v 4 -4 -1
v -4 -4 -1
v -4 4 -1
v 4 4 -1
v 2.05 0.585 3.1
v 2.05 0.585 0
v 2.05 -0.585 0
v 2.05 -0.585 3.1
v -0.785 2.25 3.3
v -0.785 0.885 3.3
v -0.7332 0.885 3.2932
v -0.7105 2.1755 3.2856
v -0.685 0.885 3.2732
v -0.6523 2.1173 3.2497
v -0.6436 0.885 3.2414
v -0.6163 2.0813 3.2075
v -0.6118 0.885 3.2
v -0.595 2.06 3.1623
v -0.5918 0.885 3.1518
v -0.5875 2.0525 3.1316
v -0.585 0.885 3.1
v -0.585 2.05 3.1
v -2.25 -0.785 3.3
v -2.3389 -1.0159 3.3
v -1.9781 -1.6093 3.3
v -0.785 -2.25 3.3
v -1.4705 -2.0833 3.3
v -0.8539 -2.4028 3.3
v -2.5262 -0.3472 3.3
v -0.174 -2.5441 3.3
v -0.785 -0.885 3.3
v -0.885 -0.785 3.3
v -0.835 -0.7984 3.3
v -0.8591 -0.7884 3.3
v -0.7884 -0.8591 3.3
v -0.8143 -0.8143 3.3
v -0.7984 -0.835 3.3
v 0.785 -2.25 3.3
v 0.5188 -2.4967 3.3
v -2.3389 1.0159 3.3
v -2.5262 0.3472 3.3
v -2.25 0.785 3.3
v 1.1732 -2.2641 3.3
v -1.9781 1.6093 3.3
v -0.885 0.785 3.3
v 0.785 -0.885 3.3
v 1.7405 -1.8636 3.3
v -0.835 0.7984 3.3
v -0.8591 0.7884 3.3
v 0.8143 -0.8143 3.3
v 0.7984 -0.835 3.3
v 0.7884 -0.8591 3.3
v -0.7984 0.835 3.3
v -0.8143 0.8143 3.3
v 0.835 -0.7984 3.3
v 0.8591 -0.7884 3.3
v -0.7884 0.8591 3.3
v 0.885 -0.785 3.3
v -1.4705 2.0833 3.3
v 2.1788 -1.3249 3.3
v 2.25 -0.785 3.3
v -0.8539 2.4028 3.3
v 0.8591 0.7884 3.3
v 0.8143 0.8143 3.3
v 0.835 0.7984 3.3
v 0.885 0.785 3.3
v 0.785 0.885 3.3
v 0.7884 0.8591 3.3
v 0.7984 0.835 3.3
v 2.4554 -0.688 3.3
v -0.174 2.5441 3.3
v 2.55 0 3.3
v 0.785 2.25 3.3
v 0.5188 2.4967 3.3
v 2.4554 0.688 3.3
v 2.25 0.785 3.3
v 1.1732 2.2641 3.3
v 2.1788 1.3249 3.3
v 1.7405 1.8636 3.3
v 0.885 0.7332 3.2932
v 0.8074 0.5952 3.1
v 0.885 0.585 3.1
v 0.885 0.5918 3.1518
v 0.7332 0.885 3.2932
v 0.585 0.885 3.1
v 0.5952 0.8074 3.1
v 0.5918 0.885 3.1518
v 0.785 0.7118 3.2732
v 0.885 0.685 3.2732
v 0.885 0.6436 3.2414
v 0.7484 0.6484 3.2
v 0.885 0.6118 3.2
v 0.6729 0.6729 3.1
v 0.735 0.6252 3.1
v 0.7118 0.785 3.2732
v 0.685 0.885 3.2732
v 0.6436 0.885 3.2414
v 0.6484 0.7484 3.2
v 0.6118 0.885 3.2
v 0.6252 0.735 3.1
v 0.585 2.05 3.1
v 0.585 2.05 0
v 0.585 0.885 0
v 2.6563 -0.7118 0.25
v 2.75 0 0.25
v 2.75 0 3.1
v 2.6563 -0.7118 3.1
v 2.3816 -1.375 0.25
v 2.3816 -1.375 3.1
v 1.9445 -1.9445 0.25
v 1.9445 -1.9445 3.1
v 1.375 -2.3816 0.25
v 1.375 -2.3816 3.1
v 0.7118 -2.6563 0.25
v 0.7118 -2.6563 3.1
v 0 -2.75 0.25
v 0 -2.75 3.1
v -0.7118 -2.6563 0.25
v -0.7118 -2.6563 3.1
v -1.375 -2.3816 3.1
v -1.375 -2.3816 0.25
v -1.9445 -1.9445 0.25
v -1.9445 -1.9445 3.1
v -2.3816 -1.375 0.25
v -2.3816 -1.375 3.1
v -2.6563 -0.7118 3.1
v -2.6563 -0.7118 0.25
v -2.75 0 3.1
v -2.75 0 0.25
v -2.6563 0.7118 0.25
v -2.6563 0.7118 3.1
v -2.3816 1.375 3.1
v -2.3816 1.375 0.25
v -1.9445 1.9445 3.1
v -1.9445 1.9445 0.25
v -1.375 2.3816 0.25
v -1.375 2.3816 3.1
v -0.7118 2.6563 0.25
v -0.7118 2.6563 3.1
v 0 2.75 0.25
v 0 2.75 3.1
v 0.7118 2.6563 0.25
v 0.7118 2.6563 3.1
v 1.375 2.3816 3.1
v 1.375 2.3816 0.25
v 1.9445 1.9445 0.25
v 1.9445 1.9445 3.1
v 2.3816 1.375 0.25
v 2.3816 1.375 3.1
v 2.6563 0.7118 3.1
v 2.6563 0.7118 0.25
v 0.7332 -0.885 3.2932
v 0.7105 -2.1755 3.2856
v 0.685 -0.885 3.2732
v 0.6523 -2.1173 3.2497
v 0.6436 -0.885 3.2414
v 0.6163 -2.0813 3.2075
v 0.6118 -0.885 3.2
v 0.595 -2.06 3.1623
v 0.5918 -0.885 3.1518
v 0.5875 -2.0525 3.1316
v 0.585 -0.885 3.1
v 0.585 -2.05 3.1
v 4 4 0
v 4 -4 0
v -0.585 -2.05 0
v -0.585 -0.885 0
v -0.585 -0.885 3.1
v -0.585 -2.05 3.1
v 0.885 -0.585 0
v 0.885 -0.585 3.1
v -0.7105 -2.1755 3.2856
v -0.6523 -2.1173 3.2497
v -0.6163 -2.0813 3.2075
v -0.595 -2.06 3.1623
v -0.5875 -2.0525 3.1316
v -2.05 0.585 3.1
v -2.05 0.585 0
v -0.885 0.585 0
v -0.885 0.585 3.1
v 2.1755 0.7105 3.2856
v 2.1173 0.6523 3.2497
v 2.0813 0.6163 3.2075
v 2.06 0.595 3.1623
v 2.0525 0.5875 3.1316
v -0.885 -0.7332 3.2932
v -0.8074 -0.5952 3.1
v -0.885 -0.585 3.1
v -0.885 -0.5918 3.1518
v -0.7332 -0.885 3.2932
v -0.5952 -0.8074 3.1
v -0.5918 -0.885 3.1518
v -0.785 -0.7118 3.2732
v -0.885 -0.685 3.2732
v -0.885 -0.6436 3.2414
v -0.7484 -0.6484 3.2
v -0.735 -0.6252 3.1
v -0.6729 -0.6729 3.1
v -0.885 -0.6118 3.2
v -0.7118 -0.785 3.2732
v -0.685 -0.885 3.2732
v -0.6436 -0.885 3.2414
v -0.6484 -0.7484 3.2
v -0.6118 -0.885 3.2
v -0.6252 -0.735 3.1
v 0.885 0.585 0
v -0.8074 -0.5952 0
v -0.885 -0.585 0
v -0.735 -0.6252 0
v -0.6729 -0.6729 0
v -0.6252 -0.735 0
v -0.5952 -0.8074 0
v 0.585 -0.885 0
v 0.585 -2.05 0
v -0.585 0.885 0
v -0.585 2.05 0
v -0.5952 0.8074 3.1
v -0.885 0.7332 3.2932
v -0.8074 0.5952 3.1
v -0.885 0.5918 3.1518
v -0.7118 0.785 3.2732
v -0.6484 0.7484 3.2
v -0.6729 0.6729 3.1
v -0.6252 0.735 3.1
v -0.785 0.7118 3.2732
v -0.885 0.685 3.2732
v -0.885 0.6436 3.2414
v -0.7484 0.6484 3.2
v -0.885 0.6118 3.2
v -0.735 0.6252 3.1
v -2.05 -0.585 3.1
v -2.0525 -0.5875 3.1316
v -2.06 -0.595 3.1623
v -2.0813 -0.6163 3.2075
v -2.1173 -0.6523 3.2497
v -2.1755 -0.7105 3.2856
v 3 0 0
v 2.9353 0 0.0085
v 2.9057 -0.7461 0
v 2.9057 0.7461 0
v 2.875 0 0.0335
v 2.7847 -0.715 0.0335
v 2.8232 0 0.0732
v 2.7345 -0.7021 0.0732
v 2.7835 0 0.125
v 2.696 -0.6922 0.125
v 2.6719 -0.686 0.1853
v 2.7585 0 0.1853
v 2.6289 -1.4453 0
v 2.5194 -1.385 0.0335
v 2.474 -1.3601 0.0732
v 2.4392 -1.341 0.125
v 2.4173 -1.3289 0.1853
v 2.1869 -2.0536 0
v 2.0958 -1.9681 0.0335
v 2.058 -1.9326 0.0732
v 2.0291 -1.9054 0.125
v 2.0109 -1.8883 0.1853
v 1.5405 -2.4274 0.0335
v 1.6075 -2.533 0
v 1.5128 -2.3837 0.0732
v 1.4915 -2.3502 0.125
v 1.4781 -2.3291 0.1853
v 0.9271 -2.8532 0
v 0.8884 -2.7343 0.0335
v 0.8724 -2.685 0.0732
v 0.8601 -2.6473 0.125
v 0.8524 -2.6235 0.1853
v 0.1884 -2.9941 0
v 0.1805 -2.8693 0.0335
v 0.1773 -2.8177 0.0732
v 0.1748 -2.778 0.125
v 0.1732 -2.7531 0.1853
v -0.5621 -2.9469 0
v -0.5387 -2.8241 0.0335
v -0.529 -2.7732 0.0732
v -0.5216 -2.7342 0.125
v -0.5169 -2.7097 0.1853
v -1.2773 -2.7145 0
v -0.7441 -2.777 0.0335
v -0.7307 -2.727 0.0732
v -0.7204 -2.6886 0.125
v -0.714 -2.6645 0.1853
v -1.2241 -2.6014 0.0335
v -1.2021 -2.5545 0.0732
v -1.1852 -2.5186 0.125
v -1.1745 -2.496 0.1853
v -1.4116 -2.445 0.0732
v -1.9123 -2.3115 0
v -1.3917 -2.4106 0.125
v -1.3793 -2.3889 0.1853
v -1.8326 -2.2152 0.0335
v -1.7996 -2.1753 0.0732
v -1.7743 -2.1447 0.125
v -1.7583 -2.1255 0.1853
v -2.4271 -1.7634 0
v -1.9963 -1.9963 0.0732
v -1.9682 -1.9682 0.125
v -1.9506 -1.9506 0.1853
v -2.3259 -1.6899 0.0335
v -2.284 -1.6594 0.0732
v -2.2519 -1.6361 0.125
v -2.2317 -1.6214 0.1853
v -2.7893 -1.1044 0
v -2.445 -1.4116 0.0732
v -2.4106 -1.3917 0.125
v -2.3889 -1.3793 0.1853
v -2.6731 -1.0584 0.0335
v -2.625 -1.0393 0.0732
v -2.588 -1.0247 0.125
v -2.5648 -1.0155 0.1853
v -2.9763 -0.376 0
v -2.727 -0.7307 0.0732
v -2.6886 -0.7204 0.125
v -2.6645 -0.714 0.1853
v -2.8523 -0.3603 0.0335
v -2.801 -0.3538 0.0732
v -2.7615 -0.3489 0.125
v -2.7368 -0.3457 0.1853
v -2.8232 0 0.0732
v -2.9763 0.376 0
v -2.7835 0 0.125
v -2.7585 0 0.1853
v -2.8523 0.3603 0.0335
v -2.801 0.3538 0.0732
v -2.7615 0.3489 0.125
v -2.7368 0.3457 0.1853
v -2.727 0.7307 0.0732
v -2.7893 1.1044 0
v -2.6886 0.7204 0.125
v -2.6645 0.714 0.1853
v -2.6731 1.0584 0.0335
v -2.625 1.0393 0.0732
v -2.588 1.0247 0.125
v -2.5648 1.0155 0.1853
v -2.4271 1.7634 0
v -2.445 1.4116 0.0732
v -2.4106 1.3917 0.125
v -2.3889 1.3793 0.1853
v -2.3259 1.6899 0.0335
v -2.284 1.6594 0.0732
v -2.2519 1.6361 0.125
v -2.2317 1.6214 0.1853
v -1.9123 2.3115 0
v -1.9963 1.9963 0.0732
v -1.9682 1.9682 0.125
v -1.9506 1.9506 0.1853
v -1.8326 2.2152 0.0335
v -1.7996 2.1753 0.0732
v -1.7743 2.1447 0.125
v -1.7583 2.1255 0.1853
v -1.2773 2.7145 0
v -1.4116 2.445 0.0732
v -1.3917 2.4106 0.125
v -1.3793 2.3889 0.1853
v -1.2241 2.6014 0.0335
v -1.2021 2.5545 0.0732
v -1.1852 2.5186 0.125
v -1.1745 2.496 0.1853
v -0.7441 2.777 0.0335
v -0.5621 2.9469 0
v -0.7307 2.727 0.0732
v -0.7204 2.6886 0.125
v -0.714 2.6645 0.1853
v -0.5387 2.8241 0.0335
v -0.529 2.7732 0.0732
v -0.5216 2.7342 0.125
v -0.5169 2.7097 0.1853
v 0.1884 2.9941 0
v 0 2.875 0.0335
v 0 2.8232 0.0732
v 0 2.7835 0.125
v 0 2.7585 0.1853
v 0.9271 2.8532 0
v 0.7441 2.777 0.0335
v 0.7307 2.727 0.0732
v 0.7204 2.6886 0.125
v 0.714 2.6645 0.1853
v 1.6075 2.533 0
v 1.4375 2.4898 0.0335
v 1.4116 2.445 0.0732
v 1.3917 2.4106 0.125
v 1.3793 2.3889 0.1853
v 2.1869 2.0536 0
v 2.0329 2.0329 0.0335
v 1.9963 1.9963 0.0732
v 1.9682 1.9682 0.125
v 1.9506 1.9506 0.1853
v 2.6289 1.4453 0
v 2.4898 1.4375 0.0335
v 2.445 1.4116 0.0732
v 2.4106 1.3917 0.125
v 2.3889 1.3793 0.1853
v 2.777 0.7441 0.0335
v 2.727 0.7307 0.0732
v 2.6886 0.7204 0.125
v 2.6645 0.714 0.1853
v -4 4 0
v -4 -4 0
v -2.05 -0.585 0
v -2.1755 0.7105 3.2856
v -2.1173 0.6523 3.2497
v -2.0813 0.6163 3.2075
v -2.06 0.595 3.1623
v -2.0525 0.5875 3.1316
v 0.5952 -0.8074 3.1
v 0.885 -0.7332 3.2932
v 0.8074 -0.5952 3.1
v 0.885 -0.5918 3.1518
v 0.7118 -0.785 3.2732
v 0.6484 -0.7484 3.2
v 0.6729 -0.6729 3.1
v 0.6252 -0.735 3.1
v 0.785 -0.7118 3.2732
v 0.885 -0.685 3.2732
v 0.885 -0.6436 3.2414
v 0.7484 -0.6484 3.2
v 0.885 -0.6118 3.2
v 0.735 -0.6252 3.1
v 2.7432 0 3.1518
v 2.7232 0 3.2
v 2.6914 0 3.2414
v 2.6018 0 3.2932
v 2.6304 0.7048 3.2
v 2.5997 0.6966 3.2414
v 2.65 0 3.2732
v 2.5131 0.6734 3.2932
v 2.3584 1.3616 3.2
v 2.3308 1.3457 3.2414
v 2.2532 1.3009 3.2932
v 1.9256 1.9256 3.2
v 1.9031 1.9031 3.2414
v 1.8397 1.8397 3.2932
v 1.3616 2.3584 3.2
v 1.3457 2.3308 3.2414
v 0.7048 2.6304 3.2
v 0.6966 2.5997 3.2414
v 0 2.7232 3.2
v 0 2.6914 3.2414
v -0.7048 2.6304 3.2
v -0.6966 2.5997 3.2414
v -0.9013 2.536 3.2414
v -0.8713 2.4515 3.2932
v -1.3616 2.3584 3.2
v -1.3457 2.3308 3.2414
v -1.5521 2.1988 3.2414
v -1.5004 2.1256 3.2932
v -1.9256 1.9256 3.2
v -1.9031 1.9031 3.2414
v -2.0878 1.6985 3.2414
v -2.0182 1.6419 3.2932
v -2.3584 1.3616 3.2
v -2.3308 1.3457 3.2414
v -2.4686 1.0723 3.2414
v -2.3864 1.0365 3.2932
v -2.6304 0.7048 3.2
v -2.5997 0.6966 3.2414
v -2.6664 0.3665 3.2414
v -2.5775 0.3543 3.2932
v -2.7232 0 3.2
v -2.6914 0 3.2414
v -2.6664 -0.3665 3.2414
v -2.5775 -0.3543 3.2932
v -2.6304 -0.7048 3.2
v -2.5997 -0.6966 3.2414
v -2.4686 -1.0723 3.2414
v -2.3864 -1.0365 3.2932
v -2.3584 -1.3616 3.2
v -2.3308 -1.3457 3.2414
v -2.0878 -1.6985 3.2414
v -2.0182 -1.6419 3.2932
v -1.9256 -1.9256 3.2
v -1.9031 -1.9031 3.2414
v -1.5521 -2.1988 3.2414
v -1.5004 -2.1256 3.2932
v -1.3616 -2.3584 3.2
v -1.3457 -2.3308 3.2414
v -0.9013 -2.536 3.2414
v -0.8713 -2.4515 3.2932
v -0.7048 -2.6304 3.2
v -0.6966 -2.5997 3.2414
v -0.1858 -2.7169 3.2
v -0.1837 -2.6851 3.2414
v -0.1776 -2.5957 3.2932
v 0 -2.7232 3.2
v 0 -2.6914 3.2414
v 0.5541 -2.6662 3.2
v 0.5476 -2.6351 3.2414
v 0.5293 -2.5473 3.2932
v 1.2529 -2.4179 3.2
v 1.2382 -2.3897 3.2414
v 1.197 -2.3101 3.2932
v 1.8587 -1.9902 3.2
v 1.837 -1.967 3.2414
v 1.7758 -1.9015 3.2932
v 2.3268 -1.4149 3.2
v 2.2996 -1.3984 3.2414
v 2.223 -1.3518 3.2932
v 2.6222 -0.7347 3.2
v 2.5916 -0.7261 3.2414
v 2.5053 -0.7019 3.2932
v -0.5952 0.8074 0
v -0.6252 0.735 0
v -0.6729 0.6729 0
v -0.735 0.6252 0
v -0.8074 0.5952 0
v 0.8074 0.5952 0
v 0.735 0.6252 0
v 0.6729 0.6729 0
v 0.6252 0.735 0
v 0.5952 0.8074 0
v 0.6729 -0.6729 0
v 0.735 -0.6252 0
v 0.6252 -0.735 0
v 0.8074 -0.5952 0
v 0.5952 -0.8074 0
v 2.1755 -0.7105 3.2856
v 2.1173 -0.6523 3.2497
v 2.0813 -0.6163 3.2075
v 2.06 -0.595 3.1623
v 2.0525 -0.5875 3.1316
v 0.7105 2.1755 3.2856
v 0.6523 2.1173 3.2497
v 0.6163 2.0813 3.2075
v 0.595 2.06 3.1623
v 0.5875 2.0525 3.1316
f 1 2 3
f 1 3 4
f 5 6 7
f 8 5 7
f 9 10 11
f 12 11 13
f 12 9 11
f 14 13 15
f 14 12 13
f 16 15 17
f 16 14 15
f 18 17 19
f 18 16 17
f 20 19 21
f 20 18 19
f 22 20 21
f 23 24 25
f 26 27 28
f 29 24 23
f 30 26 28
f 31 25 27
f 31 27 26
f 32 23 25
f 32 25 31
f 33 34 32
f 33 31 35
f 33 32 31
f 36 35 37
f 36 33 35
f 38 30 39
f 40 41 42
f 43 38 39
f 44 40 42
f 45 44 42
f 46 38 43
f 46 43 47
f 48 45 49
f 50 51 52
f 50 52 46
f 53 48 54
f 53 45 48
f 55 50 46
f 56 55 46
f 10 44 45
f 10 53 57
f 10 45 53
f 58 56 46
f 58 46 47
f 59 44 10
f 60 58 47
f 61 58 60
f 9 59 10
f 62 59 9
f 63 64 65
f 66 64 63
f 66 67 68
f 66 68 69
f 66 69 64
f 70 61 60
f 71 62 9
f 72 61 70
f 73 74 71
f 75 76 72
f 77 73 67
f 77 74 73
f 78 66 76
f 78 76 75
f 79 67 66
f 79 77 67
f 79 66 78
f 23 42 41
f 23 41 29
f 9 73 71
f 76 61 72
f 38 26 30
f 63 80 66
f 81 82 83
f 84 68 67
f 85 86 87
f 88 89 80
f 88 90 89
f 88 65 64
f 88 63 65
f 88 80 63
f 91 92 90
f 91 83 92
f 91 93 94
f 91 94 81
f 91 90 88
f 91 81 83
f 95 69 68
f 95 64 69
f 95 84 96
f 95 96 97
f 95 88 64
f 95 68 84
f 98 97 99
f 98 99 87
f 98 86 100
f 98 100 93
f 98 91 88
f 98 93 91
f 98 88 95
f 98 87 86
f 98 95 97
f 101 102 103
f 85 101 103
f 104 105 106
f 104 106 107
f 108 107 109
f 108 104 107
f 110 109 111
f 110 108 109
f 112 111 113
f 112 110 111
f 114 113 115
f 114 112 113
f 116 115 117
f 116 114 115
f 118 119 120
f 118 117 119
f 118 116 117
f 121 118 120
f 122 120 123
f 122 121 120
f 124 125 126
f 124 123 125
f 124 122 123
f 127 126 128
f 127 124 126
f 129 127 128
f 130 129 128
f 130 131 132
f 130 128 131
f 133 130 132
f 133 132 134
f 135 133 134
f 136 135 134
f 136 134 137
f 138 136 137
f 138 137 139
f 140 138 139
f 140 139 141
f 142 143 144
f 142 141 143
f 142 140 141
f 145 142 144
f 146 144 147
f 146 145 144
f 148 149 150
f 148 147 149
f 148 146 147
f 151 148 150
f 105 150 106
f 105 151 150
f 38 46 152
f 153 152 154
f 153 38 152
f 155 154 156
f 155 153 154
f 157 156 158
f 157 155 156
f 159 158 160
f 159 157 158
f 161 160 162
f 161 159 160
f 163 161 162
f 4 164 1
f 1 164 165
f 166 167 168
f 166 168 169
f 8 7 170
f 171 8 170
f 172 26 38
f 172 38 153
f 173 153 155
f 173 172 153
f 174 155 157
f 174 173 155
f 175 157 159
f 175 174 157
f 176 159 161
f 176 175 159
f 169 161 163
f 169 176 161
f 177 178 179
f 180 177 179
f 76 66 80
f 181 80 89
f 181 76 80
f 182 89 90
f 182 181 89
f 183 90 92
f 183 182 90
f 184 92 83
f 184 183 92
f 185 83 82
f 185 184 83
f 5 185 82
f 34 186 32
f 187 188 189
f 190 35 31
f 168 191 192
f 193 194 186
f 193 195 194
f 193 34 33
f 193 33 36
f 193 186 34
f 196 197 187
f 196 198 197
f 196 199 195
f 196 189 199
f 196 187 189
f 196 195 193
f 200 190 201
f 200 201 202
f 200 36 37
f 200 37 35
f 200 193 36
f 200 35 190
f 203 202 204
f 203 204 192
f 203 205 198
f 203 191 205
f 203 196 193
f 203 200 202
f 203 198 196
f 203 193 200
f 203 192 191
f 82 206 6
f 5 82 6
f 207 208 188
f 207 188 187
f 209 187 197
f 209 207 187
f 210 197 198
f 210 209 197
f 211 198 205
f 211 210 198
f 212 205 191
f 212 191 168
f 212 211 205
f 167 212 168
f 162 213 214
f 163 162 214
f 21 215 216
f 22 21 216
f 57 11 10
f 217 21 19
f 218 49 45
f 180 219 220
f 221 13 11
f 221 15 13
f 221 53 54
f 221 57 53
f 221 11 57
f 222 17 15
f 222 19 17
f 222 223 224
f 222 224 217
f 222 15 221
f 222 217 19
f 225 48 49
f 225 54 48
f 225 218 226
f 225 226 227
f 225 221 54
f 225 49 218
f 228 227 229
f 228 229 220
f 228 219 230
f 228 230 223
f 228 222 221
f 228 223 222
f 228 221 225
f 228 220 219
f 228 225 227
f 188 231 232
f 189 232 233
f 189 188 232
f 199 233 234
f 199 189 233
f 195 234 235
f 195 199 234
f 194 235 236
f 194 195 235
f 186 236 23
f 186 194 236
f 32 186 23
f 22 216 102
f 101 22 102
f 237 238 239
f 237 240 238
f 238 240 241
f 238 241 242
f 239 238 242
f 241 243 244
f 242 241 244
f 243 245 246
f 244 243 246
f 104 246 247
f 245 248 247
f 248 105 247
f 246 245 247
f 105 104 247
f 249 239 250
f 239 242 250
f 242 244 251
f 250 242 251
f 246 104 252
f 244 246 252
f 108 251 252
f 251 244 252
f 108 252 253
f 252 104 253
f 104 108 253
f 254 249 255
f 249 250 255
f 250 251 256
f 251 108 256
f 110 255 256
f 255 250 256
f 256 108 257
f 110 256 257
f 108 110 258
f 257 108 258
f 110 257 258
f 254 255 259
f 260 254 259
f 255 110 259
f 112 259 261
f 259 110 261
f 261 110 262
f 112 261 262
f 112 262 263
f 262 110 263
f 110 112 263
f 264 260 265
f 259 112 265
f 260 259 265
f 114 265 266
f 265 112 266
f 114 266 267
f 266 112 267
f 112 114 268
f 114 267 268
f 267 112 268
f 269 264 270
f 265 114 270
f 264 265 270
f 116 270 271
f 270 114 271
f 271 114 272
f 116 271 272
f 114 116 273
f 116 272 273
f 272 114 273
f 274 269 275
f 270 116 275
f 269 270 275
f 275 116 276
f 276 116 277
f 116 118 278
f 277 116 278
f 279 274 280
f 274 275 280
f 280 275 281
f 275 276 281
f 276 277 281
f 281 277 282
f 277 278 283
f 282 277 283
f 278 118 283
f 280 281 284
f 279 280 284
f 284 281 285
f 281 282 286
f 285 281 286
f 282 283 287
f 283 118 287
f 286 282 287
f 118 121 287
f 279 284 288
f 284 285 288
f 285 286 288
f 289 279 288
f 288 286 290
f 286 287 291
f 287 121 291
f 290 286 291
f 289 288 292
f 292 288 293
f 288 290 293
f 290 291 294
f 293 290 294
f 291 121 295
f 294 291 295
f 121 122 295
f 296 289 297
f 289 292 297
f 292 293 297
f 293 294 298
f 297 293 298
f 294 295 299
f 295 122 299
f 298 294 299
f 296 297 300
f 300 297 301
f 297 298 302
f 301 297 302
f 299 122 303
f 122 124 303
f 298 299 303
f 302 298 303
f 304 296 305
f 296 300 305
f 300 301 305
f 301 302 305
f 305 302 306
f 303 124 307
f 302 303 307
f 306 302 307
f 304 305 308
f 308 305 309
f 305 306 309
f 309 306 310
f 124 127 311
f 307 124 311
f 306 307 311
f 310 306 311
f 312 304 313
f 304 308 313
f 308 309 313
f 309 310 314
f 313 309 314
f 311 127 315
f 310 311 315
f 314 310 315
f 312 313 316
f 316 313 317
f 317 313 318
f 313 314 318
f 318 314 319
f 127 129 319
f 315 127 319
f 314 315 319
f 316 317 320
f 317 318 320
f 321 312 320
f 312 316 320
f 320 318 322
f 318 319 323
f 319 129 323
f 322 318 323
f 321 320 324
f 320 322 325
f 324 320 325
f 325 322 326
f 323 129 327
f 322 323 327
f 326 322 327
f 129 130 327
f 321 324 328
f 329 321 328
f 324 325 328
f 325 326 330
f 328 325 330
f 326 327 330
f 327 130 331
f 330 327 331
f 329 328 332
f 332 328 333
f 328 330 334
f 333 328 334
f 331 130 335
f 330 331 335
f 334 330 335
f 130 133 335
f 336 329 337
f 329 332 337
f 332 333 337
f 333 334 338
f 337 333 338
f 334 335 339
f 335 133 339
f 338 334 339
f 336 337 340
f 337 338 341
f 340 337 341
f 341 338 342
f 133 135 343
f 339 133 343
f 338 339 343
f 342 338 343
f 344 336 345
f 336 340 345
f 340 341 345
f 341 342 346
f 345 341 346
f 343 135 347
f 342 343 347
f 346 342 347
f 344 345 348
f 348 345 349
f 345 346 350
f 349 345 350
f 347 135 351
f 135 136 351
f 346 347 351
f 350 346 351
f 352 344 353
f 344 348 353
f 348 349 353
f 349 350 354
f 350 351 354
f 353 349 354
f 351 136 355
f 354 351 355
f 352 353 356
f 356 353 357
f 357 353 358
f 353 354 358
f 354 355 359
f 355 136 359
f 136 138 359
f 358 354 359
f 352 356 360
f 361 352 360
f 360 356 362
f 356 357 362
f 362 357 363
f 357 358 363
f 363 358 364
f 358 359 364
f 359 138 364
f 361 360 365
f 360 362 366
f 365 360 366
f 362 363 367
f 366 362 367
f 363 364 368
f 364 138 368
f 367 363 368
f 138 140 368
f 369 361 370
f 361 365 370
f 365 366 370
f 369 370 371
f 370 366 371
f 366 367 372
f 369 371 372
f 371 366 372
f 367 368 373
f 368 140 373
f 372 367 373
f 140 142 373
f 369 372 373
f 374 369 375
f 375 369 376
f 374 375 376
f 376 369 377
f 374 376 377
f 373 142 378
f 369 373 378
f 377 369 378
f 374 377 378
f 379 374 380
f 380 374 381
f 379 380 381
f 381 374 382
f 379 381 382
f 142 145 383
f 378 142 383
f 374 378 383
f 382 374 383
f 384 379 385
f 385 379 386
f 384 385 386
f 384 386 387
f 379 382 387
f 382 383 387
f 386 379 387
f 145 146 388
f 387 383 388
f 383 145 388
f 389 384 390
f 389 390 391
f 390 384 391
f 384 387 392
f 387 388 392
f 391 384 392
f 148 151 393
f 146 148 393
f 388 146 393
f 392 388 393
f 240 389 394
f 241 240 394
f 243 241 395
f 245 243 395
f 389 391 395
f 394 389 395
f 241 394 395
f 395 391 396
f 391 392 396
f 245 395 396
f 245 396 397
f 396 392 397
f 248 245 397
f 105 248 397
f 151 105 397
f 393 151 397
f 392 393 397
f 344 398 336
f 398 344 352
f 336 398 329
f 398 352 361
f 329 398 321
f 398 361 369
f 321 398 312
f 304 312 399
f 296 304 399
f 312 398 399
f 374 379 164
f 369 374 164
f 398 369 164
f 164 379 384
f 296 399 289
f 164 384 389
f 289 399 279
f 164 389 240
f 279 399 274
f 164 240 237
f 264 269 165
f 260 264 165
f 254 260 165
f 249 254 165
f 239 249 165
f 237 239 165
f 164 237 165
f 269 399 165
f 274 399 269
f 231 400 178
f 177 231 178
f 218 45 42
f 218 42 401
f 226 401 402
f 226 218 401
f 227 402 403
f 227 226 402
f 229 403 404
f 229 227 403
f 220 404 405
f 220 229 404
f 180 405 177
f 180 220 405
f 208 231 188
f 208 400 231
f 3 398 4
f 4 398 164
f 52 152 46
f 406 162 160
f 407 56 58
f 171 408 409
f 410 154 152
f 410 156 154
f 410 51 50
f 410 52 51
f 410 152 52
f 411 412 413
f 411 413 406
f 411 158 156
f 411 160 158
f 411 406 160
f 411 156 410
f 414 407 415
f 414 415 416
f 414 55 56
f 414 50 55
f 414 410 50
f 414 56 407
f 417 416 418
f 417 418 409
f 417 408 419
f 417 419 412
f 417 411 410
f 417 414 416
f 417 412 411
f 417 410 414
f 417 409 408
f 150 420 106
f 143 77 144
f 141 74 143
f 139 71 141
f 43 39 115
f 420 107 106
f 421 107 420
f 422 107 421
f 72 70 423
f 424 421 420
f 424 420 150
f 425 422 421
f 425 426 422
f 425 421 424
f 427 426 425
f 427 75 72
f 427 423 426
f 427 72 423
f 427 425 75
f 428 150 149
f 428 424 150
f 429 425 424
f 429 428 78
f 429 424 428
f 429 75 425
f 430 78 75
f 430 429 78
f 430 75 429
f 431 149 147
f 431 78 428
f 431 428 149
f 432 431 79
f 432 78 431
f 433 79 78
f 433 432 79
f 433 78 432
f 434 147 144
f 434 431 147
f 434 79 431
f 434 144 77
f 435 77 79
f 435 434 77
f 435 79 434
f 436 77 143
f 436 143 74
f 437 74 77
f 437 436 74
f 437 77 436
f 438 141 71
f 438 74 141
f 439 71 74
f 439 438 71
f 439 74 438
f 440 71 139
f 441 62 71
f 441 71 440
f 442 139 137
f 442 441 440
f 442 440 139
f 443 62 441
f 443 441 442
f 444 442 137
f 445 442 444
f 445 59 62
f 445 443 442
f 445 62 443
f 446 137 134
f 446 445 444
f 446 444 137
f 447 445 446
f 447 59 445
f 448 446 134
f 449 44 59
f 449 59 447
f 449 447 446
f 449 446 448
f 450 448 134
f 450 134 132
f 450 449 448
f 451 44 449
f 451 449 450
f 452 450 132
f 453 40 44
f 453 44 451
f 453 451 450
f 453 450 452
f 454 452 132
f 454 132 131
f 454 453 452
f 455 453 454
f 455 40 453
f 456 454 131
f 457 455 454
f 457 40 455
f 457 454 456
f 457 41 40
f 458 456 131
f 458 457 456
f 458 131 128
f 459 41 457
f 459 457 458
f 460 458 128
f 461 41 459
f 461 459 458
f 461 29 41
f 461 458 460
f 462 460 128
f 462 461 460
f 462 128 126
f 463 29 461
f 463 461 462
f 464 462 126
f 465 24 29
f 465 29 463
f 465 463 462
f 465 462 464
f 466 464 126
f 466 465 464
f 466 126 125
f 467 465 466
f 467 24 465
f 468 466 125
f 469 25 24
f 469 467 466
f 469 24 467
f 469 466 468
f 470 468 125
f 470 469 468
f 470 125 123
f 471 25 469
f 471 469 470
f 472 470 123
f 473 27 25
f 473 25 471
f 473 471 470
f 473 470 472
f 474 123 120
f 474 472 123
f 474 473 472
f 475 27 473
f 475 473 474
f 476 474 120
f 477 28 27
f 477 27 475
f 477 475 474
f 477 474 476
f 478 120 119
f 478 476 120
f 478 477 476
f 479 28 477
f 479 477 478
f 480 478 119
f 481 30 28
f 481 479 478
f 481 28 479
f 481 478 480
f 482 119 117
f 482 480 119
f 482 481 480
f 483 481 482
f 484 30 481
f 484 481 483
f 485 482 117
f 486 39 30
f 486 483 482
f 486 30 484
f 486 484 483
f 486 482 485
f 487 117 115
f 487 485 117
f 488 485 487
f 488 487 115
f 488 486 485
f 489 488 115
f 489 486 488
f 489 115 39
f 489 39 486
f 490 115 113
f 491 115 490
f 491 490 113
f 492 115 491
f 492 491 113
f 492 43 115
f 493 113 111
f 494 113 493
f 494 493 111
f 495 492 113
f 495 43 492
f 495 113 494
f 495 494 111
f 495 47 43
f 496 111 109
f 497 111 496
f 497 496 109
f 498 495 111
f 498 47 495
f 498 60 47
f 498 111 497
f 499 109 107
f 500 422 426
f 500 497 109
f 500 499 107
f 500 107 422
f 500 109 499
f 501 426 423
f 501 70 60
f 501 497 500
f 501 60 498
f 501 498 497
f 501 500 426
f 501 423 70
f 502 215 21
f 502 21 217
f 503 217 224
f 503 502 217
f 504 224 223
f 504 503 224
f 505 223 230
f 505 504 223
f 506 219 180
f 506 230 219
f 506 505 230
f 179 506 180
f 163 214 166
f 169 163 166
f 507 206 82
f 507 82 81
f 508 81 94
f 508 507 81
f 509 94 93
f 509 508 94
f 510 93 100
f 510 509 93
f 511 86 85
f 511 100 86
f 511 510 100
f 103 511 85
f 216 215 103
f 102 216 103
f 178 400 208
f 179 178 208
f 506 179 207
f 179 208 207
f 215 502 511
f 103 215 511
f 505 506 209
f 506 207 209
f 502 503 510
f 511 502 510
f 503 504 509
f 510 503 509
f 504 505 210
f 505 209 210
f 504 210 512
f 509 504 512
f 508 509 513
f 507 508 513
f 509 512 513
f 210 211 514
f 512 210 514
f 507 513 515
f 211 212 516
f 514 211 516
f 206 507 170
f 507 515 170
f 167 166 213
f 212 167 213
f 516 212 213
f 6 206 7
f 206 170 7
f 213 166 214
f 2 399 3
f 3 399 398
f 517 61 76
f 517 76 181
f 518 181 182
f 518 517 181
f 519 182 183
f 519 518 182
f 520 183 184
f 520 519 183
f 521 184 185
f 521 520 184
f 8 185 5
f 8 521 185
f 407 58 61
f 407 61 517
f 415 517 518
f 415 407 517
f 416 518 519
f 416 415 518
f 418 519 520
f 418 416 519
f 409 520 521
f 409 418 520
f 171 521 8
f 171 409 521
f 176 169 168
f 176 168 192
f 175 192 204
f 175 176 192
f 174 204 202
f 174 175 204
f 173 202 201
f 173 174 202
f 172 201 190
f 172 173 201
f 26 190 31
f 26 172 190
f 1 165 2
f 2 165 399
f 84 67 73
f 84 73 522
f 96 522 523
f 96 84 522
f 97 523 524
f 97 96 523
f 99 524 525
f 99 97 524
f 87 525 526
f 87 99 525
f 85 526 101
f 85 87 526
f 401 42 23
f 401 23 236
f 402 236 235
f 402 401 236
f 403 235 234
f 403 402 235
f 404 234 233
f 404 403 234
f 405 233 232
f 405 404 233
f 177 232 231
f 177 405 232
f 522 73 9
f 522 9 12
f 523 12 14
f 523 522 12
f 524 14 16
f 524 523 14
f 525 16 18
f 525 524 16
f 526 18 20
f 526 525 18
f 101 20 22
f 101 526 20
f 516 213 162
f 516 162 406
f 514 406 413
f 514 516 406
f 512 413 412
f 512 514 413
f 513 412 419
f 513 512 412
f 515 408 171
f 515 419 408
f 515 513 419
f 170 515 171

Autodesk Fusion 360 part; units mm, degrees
sketch "Sketch1" plane through (0, 0, 0) normal (0, 0, 1) x (1, 0, 0)
  circle A0 centre (0, 0) radius 2.75
  line L0 (0.585, -2.05) -> (-0.585, -2.05)
  line L1 (-0.585, 0.885) -> (-0.585, 2.05)
  line L2 (-0.585, 2.05) -> (0.585, 2.05)
  line L3 (0.585, -0.885) -> (0.585, -2.05)
  line L4 (0.585, -2.05) -> (-0.585, 2.05) construction
  line L5 (-0.585, -2.05) -> (0.585, 2.05) construction
  line L6 (2.05, -0.585) -> (0.885, -0.585)
  line L7 (-2.05, -0.585) -> (-2.05, 0.585)
  line L8 (0.885, 0.585) -> (2.05, 0.585)
  line L9 (2.05, 0.585) -> (2.05, -0.585)
  line L10 (2.05, -0.585) -> (-2.05, 0.585) construction
  line L11 (-2.05, -0.585) -> (2.05, 0.585) construction
  arc A1 (0.885, -0.585) -> (0.585, -0.885) centre (0.885, -0.885) ccw
  line L12 (0.585, 2.05) -> (0.585, 0.885)
  arc A2 (0.585, 0.885) -> (0.885, 0.585) centre (0.885, 0.885) ccw
  line L13 (-2.05, 0.585) -> (-0.885, 0.585)
  line L14 (-2.05, -0.585) -> (-0.885, -0.585)
  arc A3 (-0.885, 0.585) -> (-0.585, 0.885) centre (-0.885, 0.885) ccw
  line L15 (-0.585, -0.885) -> (-0.585, -2.05)
  arc A4 (-0.585, -0.885) -> (-0.885, -0.585) centre (-0.885, -0.885) ccw
  point P0 (0.585, -0.585)
  dimension "d1" = 5.5
  dimension "d2" = 1.17
  dimension "d3" = 4.1
  dimension "d4" = 4.1
  dimension "d5" = 1.17
  dimension "d6" = 0.3
  dimension "d7" = 0.3
  dimension "d8" = 0.3
  dimension "d9" = 0.3
extrude "Extrude1" add sketch "Sketch1" along normal blind 3.3
sketch "Sketch2" plane through (0, 0, 0) normal (0, 0, -1) x (1, 0, 0)
  line L0 (-2.05, 0.585) -> (-0.885, 0.585)
  arc A0 (-0.885, 0.585) -> (-0.585, 0.885) centre (-0.885, 0.885) ccw
  line L1 (-0.585, 0.885) -> (-0.585, 2.05)
  line L2 (-0.585, 2.05) -> (0.585, 2.05)
  line L3 (0.585, 2.05) -> (0.585, 0.885)
  arc A1 (0.585, 0.885) -> (0.885, 0.585) centre (0.885, 0.885) ccw
  line L4 (0.885, 0.585) -> (2.05, 0.585)
  line L5 (2.05, 0.585) -> (2.05, -0.585)
  line L6 (2.05, -0.585) -> (0.885, -0.585)
  arc A2 (0.885, -0.585) -> (0.585, -0.885) centre (0.885, -0.885) ccw
  line L7 (0.585, -0.885) -> (0.585, -2.05)
  line L8 (0.585, -2.05) -> (-0.585, -2.05)
  line L9 (-0.585, -2.05) -> (-0.585, -0.885)
  arc A3 (-0.585, -0.885) -> (-0.885, -0.585) centre (-0.885, -0.885) ccw
  line L10 (-0.885, -0.585) -> (-2.05, -0.585)
  line L11 (-2.05, -0.585) -> (-2.05, 0.585)
  circle A4 centre (0, 0) radius 2.75
  line L12 (4, 4) -> (-4, 4)
  line L13 (-4, 4) -> (-4, -4)
  line L14 (-4, -4) -> (4, -4)
  line L15 (4, -4) -> (4, 4)
  line L16 (4, 4) -> (-4, -4) construction
  line L17 (-4, 4) -> (4, -4) construction
  dimension "d12" = 8
  dimension "d13" = 8
extrude "Extrude2" add sketch "Sketch2" along normal blind 1 contours L0 A0 L1 L2 L3 A1 L4 L5 L6 A2 L7 L8 L9 A3 L10 L11 | A4 | L12 L13 L14 L15
fillet "Fillet1" radius 0.25 1 edges at (-2.5639, -0.9944, 0)
fillet "Fillet2" radius 0.2 1 edges at (-2.5639, -0.9944, 3.3)
fillet "Fillet3" radius 0.2 16 edges at (1.4675, -0.585, 3.3) (0.6729, -0.6729, 3.3) (0.585, -1.4675, 3.3) (2.05, 0, 3.3) (0.585, 1.4675, 3.3) (0.6729, 0.6729, 3.3) (1.4675, 0.585, 3.3) (0, 2.05, 3.3) (-1.4675, 0.585, 3.3) (-0.6729, 0.6729, 3.3) (-0.585, 1.4675, 3.3) (-2.05, 0, 3.3) (-0.585, -1.4675, 3.3) (-0.6729, -0.6729, 3.3) (-1.4675, -0.585, 3.3) (0, -2.05, 3.3)
